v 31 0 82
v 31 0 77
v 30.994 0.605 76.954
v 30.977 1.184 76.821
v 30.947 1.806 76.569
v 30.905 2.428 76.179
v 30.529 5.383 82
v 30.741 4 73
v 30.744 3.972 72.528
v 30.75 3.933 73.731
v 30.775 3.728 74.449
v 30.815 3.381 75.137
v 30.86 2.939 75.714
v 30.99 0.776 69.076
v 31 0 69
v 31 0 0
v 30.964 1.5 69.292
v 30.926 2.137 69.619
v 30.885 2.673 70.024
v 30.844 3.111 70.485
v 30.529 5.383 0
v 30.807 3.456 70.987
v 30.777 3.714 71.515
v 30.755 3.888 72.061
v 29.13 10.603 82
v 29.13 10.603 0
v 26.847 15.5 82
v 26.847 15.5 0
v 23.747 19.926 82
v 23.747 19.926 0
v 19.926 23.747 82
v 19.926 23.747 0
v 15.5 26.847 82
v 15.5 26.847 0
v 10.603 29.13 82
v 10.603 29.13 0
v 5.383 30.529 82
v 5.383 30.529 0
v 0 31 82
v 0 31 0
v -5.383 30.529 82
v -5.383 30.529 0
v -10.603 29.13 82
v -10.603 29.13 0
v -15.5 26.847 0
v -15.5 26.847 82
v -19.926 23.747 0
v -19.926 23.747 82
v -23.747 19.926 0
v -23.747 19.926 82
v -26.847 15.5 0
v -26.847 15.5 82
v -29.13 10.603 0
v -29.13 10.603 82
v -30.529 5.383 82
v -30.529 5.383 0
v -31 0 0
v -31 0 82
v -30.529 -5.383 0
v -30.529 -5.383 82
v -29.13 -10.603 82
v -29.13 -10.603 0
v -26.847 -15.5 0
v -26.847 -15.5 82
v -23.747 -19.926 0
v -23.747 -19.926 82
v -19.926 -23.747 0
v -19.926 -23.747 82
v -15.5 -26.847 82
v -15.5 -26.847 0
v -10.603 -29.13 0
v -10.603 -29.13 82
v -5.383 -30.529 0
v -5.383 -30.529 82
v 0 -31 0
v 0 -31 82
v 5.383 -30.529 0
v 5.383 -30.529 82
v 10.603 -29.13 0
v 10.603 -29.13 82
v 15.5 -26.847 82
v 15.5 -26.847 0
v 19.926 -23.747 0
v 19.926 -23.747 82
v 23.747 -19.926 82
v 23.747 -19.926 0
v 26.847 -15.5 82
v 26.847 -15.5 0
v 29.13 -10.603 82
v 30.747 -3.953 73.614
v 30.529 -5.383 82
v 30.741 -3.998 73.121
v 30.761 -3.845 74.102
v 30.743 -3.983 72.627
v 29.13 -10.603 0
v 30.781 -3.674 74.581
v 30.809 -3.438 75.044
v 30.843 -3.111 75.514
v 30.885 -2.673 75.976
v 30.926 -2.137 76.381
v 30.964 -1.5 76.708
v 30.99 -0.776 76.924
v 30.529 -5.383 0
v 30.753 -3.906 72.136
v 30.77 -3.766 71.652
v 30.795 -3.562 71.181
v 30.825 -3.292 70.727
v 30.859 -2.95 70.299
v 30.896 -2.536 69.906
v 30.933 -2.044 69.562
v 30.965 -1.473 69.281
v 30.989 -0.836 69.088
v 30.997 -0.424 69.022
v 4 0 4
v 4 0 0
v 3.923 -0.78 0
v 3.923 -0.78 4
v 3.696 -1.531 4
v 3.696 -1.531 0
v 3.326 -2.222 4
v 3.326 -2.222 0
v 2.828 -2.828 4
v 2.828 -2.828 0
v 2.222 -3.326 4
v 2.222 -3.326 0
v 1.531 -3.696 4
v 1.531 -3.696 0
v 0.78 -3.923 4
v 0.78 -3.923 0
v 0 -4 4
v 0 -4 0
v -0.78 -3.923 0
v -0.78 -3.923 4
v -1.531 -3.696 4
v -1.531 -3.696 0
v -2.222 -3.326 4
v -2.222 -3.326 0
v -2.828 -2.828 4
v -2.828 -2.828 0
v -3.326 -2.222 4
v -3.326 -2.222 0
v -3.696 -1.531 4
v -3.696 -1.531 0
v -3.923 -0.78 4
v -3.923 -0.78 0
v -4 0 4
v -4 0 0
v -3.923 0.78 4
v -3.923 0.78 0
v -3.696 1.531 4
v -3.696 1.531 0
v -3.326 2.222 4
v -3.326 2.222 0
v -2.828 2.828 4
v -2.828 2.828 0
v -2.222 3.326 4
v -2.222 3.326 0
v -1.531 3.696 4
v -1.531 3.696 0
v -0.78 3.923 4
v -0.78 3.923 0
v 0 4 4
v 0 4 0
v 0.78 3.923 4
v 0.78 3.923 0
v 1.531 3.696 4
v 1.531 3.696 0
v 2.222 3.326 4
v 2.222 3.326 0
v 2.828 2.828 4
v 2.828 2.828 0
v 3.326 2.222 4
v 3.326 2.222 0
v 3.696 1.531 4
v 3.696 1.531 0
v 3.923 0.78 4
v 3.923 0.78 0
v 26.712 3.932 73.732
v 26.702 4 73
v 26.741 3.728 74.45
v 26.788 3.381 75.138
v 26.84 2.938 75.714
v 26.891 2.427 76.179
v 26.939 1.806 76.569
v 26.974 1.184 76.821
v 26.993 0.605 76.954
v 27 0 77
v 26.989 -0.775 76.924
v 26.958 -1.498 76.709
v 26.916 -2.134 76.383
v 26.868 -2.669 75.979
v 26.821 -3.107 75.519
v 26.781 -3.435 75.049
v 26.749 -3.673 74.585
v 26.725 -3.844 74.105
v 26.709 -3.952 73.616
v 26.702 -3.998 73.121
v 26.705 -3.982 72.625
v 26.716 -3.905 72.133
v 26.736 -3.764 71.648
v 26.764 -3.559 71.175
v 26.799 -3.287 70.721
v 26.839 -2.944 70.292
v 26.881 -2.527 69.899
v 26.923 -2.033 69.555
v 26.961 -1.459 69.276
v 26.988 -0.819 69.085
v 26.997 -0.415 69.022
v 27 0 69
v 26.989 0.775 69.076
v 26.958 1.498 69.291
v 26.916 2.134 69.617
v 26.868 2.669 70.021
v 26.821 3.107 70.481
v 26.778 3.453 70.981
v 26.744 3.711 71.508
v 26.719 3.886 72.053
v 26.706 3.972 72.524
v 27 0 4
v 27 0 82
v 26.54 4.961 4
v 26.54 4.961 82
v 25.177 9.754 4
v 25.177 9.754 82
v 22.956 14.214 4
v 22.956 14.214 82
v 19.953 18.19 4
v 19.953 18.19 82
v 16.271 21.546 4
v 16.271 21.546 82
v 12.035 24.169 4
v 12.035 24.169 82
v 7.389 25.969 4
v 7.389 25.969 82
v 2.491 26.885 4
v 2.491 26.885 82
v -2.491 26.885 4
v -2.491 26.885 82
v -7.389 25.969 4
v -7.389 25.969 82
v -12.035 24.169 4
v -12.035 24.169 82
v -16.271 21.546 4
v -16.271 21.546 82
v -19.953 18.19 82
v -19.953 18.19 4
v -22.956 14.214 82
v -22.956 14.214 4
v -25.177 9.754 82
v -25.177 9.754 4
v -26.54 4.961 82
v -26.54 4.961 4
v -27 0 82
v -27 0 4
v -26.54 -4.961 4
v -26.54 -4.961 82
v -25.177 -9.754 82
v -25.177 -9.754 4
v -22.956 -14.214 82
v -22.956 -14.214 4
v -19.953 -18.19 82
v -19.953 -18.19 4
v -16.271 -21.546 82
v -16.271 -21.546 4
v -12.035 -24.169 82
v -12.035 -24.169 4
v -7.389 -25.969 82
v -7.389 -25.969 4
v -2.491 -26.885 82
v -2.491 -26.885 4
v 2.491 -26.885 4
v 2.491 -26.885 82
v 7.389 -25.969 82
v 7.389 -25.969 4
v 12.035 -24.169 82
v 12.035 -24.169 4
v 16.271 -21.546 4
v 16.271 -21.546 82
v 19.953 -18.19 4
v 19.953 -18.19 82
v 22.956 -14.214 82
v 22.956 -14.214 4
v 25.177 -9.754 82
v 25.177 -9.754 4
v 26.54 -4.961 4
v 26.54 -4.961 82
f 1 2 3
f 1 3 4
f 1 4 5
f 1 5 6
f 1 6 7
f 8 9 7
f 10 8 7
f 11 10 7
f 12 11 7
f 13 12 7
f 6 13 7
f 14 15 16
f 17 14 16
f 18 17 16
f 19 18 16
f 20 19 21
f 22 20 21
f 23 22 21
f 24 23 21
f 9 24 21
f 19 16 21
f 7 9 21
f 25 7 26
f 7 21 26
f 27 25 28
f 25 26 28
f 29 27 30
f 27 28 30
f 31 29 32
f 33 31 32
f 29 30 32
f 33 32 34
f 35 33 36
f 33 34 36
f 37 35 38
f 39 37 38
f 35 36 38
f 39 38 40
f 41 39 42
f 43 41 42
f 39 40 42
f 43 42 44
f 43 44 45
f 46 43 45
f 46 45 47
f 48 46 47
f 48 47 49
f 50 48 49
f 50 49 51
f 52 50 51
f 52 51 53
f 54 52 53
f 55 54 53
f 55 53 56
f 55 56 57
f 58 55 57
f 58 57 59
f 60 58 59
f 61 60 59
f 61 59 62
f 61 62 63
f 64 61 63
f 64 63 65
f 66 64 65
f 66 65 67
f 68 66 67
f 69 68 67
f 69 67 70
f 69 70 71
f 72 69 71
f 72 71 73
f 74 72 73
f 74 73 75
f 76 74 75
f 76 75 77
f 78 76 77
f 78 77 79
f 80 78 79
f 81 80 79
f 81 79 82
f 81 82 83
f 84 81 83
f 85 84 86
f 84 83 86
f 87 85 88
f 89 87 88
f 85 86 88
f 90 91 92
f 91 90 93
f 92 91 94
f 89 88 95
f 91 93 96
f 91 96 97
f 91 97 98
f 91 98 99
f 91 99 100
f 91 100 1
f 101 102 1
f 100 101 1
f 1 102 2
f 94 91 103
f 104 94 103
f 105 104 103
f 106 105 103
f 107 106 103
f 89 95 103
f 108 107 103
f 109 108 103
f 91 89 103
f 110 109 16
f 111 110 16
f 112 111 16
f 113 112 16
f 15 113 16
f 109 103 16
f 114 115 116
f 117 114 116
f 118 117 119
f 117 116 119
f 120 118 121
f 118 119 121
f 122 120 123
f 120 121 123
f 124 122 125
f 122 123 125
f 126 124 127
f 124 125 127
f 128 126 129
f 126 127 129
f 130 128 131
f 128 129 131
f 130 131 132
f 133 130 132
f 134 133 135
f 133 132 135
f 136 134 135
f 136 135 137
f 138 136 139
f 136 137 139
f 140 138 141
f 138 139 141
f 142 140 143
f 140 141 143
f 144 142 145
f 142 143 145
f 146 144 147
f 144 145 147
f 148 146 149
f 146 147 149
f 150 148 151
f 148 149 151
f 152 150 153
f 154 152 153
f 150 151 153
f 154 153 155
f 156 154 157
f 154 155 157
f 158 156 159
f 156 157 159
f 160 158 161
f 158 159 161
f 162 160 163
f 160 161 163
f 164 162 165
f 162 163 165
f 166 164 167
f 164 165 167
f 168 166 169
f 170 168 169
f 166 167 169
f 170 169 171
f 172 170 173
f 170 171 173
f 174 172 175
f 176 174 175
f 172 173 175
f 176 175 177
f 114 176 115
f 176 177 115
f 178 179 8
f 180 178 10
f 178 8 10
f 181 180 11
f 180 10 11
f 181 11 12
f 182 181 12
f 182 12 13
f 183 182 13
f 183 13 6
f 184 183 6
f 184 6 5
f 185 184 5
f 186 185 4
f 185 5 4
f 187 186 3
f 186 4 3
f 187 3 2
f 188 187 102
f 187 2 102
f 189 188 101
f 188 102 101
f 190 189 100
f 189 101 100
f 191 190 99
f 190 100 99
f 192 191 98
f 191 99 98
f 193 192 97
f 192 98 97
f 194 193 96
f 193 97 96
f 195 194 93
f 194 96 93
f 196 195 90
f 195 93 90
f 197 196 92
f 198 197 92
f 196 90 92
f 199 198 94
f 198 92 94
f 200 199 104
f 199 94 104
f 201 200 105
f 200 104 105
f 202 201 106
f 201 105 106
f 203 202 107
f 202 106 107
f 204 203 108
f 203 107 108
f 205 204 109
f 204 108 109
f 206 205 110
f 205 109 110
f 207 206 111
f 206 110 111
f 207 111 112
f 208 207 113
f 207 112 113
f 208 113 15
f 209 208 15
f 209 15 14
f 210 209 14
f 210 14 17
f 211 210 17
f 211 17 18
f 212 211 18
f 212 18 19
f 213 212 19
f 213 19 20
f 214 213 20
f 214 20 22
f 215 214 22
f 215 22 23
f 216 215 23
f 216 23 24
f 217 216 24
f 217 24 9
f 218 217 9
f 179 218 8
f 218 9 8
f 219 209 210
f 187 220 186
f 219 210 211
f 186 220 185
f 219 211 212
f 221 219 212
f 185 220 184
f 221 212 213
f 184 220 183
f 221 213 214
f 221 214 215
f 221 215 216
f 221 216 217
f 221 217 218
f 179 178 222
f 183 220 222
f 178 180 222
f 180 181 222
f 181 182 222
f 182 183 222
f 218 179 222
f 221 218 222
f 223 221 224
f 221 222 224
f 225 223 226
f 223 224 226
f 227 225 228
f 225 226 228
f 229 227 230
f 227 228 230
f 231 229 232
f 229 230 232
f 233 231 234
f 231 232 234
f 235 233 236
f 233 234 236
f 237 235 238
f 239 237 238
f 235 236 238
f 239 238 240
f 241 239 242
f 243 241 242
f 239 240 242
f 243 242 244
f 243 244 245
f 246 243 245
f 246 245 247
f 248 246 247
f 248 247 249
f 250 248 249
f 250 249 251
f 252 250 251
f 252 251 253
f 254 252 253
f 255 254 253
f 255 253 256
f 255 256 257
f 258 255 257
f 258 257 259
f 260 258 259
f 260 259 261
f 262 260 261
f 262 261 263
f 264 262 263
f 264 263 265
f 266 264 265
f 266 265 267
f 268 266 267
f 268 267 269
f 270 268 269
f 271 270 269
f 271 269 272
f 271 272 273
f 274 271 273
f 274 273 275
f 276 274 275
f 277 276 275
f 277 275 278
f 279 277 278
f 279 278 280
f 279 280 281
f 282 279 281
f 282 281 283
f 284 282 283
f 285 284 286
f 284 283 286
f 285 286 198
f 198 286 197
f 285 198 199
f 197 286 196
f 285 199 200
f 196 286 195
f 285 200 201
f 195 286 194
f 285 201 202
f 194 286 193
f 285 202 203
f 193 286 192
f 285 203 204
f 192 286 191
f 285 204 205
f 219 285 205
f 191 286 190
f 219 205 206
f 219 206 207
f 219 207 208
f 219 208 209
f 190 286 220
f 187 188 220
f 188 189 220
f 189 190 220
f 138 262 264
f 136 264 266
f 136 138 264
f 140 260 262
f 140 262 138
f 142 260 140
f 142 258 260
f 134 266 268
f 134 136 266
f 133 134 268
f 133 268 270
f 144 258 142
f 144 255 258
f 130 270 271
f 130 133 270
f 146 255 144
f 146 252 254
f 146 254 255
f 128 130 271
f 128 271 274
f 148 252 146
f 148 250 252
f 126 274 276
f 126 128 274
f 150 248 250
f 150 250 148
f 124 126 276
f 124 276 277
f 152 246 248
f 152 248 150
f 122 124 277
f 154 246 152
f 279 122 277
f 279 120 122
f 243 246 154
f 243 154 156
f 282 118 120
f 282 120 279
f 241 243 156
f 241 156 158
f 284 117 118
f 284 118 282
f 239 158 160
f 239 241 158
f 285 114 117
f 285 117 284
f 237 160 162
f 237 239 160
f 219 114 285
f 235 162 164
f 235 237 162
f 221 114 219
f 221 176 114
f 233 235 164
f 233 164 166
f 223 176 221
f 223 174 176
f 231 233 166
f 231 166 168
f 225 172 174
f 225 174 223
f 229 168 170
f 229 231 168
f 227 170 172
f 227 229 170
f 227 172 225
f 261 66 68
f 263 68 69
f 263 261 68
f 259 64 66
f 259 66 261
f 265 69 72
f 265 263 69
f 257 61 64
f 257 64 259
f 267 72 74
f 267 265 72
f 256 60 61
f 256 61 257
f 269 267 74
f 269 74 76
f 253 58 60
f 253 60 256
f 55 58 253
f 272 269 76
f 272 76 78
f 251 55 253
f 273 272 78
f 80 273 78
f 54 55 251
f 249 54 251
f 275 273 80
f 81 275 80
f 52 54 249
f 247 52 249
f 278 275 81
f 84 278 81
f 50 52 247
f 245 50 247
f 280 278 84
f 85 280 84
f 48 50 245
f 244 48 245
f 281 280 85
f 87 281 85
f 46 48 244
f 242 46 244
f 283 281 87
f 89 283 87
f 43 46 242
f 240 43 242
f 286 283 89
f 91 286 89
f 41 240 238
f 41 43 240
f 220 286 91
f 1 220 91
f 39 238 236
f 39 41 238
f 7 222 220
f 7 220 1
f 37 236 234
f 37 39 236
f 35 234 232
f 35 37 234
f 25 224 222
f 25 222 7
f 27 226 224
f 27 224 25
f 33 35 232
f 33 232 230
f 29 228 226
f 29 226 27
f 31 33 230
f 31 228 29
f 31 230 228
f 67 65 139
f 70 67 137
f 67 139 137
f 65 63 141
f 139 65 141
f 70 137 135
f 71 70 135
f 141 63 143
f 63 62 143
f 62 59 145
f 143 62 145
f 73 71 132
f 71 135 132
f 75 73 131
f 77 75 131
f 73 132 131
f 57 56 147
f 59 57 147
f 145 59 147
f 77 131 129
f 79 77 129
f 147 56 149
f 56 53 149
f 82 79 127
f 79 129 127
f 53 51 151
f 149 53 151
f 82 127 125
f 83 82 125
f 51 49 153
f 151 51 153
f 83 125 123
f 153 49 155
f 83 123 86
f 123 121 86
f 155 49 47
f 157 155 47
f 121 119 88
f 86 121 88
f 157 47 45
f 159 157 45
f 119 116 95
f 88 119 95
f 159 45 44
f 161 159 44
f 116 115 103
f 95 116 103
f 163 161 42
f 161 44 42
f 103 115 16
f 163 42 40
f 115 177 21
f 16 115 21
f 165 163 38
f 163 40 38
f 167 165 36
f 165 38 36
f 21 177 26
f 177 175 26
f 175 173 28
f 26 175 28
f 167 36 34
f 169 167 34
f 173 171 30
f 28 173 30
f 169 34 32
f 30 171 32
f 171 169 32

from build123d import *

# Parameters (mm, degrees)
F0_R     = 31
F1_DEPTH = 82
F2_R     = 27
F3_DEPTH = 78
F4_R     = 4
F5_DEPTH = 4
F7_R     = 4
F8_DEPTH = 4.2989402544


with BuildPart() as f1:
    # F0 (on Top) → F1 (new body)
    with BuildSketch(Plane.XY):
        Circle(F0_R)
    extrude(amount=F1_DEPTH)

    # F2 (on face) → F3 (cut)
    with BuildSketch(Plane.XY.offset(82)):
        Circle(F2_R)
    extrude(amount=-F3_DEPTH, mode=Mode.SUBTRACT)

    # F4 (on face) → F5 (cut, through all)
    with BuildSketch(Plane(origin=(0, 0, 0), x_dir=(1, 0, 0), z_dir=(0, 0, -1))):
        Circle(F4_R)
    extrude(amount=-F5_DEPTH, mode=Mode.SUBTRACT)

    # F7 (on offset) → F8 (cut, through all)
    with BuildSketch(Plane.YZ.offset(31)):
        with Locations((0, 73)):
            Circle(F7_R)
    extrude(amount=-F8_DEPTH, mode=Mode.SUBTRACT)


solid = f1.part
